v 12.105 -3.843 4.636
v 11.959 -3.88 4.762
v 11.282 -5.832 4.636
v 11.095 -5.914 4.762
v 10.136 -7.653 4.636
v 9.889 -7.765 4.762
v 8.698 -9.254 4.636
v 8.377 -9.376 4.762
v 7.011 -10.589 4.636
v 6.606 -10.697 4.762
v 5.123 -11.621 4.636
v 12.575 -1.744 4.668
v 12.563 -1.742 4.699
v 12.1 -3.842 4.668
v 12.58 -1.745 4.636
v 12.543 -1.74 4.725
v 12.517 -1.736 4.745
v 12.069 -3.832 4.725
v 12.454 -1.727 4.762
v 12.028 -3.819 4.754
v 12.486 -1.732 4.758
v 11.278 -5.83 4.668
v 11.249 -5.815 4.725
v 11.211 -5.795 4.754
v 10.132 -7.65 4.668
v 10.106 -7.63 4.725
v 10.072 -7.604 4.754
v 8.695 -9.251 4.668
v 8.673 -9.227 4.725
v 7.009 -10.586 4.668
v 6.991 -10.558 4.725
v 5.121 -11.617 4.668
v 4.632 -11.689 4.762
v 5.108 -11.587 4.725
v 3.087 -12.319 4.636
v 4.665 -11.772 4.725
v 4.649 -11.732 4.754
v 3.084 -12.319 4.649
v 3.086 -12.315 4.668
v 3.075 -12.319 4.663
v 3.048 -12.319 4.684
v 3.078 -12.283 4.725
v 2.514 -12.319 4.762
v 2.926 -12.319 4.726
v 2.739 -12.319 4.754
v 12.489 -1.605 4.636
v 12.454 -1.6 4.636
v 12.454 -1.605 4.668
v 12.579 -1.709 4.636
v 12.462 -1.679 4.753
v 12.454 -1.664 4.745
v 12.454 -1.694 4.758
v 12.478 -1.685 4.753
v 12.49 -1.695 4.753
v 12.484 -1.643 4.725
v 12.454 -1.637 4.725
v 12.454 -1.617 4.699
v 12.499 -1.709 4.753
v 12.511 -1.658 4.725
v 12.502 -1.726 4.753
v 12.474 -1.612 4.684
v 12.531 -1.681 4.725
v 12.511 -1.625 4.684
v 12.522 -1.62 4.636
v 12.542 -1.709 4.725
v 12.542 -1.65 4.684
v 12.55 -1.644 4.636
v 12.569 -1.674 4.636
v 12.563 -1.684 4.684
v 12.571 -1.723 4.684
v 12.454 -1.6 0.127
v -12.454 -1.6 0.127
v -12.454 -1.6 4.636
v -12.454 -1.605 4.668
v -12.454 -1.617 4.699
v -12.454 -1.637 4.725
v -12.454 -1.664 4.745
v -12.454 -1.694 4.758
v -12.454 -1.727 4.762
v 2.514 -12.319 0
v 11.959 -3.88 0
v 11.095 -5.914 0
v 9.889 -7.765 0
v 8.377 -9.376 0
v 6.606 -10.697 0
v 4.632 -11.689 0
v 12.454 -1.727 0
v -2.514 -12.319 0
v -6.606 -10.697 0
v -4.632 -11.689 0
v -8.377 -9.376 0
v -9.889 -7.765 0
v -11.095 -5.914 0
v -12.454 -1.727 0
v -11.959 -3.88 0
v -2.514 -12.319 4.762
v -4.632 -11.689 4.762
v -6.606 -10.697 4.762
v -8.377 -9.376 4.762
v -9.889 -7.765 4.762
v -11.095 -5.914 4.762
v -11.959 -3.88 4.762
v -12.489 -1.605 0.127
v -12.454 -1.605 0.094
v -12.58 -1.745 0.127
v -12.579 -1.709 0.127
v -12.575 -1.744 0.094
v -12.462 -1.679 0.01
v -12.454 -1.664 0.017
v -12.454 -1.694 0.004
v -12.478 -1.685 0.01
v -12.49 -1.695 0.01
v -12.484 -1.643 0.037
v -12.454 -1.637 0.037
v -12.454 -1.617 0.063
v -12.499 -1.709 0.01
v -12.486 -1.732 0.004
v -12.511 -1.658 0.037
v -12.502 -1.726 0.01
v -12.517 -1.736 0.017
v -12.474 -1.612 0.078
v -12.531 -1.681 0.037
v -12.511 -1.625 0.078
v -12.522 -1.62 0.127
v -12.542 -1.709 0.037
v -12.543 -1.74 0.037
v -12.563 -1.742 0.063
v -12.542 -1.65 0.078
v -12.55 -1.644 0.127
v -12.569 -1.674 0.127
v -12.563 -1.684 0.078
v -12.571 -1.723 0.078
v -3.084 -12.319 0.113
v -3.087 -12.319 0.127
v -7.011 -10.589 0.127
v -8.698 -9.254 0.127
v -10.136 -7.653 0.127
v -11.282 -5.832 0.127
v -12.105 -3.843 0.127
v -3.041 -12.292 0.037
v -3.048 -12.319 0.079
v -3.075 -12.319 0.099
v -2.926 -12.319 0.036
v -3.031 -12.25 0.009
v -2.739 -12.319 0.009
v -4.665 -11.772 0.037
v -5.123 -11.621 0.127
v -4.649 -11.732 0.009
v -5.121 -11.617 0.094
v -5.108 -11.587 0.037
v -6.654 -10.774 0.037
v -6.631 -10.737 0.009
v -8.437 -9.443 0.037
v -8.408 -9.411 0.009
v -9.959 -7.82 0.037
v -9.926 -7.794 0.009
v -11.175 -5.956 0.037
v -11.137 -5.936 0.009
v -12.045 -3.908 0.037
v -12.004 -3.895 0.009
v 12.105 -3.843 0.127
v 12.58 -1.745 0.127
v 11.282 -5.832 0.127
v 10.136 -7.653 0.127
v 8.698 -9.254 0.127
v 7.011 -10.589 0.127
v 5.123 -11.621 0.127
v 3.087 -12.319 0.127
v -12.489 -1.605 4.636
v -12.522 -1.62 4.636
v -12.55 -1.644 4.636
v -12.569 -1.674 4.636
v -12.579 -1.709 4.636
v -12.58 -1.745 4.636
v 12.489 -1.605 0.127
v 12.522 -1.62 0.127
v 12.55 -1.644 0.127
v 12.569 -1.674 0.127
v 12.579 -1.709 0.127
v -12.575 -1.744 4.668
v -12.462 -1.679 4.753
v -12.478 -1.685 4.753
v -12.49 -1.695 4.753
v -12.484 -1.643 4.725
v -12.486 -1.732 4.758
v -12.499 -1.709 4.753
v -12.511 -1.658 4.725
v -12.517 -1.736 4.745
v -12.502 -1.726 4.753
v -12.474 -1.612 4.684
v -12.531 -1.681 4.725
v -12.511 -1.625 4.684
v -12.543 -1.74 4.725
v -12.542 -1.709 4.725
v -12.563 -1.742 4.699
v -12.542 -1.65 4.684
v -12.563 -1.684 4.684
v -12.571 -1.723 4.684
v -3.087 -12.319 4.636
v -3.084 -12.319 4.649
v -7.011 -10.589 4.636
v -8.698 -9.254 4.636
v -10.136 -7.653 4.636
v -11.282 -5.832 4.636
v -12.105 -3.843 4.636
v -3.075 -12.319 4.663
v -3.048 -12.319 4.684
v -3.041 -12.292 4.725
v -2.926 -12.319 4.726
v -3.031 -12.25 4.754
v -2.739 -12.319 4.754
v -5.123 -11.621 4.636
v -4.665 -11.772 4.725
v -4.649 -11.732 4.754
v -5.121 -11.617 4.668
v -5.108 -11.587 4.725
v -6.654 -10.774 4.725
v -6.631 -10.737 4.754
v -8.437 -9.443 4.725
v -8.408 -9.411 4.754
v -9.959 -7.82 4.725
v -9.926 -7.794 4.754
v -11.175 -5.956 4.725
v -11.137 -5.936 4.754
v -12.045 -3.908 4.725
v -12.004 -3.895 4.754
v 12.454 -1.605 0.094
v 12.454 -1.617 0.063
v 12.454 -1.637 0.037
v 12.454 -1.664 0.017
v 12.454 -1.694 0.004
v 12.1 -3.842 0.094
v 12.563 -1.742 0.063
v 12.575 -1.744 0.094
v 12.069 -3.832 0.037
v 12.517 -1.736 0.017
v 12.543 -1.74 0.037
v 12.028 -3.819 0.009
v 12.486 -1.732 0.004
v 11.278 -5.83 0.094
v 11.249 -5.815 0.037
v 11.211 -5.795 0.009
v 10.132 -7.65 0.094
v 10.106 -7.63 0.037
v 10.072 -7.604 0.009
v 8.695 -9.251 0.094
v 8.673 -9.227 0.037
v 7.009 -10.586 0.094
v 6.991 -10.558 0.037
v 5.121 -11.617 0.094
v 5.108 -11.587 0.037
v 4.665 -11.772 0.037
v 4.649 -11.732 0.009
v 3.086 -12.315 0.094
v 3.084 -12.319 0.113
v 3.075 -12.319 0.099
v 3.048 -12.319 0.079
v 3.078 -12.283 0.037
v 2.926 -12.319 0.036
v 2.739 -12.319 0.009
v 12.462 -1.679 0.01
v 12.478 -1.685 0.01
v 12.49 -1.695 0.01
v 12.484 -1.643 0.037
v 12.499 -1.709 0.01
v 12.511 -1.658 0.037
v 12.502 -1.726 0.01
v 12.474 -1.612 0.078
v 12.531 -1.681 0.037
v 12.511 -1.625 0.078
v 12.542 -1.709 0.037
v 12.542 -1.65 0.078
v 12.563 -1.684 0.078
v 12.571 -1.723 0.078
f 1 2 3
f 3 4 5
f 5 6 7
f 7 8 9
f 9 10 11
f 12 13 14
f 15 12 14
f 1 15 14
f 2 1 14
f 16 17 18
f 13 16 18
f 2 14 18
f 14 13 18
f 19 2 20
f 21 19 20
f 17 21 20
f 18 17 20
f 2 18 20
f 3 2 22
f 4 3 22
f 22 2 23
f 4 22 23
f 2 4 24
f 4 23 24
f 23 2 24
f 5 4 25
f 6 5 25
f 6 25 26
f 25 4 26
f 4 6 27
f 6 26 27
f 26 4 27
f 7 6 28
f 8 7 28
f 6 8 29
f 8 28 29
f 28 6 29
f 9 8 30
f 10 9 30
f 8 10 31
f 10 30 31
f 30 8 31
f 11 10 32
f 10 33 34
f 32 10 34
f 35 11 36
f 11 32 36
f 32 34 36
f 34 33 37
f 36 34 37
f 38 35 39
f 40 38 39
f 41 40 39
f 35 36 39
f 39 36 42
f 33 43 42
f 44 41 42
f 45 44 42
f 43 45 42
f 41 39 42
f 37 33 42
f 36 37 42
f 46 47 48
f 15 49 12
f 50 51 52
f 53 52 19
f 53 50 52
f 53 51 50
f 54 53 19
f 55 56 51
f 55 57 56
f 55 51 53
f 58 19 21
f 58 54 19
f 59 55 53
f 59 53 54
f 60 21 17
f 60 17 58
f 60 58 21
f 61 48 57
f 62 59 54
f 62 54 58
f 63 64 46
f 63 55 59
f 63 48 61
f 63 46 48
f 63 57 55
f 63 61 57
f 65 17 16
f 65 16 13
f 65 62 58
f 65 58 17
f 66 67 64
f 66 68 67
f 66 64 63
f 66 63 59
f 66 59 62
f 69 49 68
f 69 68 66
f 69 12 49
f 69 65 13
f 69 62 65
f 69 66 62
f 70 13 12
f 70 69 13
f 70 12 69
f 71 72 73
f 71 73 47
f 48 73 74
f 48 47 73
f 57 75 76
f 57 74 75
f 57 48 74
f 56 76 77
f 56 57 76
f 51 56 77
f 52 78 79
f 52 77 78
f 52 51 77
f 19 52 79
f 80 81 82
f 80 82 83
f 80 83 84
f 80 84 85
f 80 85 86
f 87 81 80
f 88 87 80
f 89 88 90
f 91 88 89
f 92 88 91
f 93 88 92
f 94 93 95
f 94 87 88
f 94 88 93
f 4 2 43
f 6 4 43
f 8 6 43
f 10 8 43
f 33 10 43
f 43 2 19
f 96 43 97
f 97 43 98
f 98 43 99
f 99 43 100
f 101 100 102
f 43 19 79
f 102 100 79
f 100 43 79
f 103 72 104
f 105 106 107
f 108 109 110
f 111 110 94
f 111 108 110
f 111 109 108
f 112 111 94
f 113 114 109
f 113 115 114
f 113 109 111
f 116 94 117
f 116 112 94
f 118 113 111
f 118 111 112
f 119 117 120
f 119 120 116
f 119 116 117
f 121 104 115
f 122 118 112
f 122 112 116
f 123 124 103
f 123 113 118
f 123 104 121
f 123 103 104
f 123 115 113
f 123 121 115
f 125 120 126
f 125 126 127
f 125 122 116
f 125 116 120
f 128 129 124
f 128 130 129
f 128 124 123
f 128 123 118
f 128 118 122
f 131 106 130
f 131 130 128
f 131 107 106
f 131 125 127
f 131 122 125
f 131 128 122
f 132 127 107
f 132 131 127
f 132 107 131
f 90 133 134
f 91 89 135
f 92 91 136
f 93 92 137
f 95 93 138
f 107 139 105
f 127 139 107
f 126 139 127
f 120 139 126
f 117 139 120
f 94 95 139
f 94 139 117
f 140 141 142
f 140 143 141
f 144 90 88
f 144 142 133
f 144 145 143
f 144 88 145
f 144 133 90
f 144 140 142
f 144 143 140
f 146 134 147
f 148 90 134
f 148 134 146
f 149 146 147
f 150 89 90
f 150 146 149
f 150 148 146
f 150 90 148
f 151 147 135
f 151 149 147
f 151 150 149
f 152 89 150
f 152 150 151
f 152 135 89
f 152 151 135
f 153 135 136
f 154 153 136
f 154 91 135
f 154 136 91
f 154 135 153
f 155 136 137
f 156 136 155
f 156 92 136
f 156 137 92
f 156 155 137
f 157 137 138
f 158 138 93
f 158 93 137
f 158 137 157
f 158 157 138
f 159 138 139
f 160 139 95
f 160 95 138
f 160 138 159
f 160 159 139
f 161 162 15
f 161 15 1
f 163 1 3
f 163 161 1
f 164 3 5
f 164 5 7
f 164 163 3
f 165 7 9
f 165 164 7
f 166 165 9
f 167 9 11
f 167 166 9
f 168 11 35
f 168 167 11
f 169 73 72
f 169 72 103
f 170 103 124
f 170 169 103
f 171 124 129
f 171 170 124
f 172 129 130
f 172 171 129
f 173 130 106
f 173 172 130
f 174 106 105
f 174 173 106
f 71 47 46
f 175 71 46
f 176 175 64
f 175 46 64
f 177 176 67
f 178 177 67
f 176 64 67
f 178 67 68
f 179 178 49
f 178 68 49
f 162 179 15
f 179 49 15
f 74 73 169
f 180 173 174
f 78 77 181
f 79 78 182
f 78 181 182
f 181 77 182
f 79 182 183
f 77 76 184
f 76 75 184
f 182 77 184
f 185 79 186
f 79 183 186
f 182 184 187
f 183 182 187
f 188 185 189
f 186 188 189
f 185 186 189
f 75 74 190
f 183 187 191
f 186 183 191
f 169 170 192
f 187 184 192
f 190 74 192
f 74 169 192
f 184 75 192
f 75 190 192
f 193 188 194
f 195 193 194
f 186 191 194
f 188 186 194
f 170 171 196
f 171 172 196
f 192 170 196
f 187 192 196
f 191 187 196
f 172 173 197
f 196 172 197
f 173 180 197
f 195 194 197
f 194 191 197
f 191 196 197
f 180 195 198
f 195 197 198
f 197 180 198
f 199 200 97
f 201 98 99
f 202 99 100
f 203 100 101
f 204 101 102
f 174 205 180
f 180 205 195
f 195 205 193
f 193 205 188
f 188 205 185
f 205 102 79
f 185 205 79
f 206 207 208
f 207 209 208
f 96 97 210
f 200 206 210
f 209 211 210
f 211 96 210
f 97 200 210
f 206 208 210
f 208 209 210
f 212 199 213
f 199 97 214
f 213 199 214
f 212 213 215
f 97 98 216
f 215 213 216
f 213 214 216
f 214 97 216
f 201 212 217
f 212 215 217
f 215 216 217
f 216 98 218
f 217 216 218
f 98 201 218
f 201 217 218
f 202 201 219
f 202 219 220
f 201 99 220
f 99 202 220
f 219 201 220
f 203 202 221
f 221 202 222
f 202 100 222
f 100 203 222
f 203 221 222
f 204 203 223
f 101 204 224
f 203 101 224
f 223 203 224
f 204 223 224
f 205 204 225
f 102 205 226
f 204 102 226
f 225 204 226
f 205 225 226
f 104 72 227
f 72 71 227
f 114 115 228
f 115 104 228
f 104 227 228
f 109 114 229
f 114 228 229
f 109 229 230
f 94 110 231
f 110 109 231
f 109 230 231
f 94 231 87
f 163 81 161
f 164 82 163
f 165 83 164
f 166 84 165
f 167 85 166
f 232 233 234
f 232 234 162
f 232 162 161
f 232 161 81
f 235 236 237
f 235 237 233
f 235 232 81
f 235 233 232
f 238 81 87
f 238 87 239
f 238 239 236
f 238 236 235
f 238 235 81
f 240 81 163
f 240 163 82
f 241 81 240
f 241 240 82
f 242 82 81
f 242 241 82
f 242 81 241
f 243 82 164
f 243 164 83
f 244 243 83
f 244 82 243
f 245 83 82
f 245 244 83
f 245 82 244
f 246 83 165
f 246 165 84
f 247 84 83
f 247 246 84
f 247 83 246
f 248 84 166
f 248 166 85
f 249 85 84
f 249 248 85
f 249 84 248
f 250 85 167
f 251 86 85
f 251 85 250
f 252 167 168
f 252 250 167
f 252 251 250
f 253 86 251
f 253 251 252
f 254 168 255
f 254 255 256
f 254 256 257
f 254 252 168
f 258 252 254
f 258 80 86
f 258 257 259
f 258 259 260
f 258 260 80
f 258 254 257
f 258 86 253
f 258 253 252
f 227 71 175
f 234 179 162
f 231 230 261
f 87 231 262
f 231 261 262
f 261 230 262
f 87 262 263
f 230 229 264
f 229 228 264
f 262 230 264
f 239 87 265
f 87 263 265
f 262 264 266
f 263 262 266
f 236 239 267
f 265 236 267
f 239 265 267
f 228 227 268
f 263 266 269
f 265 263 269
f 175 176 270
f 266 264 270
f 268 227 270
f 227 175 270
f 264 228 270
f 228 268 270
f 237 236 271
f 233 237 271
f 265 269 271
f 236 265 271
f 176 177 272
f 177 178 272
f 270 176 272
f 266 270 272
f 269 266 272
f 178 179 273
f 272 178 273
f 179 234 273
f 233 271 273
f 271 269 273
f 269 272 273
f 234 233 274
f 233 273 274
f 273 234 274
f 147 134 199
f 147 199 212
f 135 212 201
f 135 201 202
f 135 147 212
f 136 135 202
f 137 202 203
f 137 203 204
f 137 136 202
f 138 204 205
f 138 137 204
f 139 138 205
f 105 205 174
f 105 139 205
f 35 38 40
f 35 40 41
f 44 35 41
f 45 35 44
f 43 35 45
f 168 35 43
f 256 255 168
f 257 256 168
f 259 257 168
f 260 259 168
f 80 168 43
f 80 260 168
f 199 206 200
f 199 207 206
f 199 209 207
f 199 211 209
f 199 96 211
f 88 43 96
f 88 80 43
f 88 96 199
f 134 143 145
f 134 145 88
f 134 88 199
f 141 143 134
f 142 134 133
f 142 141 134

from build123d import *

# Parameters (mm, degrees)
EXTRUDE1_DEPTH          = 4.7625
FILLET3_R               = 0.127
CUT_EXTRUDE2_DEPTH      = 19.499943496
CUT_EXTRUDE2_DEPTH_BACK = 19.499943496


with BuildPart() as part:
    # Sketch1 → Extrude1 (new body)
    with BuildSketch(Plane.XY):
        with BuildLine():
            Line((-12.598784067, -1.6002), (12.598784067, -1.6002))
            ThreePointArc((12.598784067, -1.6002), (0, -12.7), (-12.598784067, -1.6002))
        make_face()
    extrude(amount=EXTRUDE1_DEPTH)

    # Fillet3
    fillet3_edges = [part.edges().sort_by_distance(p)[0] for p in [
        (12.598784067, -1.6002, 2.38125),
        (-12.598784067, -1.6002, 2.38125),
        (0, -1.6002, 4.7625),
        (0, -12.7, 4.7625),
        (0, -1.6002, 0),
        (0, -12.7, 0),
    ]]
    fillet(fillet3_edges, radius=FILLET3_R)

    # Sketch3 → Cut-Extrude2 (cut, two sides: drawn at the far end of the back side and taken through both)
    with BuildSketch(Plane.XY.offset(-CUT_EXTRUDE2_DEPTH_BACK)):
        Polygon((-189.36155496, -12.319), (-50.8, -12.319), (50.8, -12.319), (189.36155496, -12.319), (189.36155496, -289.44210992), (-189.36155496, -289.44210992), align=None)
    extrude(amount=CUT_EXTRUDE2_DEPTH + CUT_EXTRUDE2_DEPTH_BACK, mode=Mode.SUBTRACT)


solid = part.part
